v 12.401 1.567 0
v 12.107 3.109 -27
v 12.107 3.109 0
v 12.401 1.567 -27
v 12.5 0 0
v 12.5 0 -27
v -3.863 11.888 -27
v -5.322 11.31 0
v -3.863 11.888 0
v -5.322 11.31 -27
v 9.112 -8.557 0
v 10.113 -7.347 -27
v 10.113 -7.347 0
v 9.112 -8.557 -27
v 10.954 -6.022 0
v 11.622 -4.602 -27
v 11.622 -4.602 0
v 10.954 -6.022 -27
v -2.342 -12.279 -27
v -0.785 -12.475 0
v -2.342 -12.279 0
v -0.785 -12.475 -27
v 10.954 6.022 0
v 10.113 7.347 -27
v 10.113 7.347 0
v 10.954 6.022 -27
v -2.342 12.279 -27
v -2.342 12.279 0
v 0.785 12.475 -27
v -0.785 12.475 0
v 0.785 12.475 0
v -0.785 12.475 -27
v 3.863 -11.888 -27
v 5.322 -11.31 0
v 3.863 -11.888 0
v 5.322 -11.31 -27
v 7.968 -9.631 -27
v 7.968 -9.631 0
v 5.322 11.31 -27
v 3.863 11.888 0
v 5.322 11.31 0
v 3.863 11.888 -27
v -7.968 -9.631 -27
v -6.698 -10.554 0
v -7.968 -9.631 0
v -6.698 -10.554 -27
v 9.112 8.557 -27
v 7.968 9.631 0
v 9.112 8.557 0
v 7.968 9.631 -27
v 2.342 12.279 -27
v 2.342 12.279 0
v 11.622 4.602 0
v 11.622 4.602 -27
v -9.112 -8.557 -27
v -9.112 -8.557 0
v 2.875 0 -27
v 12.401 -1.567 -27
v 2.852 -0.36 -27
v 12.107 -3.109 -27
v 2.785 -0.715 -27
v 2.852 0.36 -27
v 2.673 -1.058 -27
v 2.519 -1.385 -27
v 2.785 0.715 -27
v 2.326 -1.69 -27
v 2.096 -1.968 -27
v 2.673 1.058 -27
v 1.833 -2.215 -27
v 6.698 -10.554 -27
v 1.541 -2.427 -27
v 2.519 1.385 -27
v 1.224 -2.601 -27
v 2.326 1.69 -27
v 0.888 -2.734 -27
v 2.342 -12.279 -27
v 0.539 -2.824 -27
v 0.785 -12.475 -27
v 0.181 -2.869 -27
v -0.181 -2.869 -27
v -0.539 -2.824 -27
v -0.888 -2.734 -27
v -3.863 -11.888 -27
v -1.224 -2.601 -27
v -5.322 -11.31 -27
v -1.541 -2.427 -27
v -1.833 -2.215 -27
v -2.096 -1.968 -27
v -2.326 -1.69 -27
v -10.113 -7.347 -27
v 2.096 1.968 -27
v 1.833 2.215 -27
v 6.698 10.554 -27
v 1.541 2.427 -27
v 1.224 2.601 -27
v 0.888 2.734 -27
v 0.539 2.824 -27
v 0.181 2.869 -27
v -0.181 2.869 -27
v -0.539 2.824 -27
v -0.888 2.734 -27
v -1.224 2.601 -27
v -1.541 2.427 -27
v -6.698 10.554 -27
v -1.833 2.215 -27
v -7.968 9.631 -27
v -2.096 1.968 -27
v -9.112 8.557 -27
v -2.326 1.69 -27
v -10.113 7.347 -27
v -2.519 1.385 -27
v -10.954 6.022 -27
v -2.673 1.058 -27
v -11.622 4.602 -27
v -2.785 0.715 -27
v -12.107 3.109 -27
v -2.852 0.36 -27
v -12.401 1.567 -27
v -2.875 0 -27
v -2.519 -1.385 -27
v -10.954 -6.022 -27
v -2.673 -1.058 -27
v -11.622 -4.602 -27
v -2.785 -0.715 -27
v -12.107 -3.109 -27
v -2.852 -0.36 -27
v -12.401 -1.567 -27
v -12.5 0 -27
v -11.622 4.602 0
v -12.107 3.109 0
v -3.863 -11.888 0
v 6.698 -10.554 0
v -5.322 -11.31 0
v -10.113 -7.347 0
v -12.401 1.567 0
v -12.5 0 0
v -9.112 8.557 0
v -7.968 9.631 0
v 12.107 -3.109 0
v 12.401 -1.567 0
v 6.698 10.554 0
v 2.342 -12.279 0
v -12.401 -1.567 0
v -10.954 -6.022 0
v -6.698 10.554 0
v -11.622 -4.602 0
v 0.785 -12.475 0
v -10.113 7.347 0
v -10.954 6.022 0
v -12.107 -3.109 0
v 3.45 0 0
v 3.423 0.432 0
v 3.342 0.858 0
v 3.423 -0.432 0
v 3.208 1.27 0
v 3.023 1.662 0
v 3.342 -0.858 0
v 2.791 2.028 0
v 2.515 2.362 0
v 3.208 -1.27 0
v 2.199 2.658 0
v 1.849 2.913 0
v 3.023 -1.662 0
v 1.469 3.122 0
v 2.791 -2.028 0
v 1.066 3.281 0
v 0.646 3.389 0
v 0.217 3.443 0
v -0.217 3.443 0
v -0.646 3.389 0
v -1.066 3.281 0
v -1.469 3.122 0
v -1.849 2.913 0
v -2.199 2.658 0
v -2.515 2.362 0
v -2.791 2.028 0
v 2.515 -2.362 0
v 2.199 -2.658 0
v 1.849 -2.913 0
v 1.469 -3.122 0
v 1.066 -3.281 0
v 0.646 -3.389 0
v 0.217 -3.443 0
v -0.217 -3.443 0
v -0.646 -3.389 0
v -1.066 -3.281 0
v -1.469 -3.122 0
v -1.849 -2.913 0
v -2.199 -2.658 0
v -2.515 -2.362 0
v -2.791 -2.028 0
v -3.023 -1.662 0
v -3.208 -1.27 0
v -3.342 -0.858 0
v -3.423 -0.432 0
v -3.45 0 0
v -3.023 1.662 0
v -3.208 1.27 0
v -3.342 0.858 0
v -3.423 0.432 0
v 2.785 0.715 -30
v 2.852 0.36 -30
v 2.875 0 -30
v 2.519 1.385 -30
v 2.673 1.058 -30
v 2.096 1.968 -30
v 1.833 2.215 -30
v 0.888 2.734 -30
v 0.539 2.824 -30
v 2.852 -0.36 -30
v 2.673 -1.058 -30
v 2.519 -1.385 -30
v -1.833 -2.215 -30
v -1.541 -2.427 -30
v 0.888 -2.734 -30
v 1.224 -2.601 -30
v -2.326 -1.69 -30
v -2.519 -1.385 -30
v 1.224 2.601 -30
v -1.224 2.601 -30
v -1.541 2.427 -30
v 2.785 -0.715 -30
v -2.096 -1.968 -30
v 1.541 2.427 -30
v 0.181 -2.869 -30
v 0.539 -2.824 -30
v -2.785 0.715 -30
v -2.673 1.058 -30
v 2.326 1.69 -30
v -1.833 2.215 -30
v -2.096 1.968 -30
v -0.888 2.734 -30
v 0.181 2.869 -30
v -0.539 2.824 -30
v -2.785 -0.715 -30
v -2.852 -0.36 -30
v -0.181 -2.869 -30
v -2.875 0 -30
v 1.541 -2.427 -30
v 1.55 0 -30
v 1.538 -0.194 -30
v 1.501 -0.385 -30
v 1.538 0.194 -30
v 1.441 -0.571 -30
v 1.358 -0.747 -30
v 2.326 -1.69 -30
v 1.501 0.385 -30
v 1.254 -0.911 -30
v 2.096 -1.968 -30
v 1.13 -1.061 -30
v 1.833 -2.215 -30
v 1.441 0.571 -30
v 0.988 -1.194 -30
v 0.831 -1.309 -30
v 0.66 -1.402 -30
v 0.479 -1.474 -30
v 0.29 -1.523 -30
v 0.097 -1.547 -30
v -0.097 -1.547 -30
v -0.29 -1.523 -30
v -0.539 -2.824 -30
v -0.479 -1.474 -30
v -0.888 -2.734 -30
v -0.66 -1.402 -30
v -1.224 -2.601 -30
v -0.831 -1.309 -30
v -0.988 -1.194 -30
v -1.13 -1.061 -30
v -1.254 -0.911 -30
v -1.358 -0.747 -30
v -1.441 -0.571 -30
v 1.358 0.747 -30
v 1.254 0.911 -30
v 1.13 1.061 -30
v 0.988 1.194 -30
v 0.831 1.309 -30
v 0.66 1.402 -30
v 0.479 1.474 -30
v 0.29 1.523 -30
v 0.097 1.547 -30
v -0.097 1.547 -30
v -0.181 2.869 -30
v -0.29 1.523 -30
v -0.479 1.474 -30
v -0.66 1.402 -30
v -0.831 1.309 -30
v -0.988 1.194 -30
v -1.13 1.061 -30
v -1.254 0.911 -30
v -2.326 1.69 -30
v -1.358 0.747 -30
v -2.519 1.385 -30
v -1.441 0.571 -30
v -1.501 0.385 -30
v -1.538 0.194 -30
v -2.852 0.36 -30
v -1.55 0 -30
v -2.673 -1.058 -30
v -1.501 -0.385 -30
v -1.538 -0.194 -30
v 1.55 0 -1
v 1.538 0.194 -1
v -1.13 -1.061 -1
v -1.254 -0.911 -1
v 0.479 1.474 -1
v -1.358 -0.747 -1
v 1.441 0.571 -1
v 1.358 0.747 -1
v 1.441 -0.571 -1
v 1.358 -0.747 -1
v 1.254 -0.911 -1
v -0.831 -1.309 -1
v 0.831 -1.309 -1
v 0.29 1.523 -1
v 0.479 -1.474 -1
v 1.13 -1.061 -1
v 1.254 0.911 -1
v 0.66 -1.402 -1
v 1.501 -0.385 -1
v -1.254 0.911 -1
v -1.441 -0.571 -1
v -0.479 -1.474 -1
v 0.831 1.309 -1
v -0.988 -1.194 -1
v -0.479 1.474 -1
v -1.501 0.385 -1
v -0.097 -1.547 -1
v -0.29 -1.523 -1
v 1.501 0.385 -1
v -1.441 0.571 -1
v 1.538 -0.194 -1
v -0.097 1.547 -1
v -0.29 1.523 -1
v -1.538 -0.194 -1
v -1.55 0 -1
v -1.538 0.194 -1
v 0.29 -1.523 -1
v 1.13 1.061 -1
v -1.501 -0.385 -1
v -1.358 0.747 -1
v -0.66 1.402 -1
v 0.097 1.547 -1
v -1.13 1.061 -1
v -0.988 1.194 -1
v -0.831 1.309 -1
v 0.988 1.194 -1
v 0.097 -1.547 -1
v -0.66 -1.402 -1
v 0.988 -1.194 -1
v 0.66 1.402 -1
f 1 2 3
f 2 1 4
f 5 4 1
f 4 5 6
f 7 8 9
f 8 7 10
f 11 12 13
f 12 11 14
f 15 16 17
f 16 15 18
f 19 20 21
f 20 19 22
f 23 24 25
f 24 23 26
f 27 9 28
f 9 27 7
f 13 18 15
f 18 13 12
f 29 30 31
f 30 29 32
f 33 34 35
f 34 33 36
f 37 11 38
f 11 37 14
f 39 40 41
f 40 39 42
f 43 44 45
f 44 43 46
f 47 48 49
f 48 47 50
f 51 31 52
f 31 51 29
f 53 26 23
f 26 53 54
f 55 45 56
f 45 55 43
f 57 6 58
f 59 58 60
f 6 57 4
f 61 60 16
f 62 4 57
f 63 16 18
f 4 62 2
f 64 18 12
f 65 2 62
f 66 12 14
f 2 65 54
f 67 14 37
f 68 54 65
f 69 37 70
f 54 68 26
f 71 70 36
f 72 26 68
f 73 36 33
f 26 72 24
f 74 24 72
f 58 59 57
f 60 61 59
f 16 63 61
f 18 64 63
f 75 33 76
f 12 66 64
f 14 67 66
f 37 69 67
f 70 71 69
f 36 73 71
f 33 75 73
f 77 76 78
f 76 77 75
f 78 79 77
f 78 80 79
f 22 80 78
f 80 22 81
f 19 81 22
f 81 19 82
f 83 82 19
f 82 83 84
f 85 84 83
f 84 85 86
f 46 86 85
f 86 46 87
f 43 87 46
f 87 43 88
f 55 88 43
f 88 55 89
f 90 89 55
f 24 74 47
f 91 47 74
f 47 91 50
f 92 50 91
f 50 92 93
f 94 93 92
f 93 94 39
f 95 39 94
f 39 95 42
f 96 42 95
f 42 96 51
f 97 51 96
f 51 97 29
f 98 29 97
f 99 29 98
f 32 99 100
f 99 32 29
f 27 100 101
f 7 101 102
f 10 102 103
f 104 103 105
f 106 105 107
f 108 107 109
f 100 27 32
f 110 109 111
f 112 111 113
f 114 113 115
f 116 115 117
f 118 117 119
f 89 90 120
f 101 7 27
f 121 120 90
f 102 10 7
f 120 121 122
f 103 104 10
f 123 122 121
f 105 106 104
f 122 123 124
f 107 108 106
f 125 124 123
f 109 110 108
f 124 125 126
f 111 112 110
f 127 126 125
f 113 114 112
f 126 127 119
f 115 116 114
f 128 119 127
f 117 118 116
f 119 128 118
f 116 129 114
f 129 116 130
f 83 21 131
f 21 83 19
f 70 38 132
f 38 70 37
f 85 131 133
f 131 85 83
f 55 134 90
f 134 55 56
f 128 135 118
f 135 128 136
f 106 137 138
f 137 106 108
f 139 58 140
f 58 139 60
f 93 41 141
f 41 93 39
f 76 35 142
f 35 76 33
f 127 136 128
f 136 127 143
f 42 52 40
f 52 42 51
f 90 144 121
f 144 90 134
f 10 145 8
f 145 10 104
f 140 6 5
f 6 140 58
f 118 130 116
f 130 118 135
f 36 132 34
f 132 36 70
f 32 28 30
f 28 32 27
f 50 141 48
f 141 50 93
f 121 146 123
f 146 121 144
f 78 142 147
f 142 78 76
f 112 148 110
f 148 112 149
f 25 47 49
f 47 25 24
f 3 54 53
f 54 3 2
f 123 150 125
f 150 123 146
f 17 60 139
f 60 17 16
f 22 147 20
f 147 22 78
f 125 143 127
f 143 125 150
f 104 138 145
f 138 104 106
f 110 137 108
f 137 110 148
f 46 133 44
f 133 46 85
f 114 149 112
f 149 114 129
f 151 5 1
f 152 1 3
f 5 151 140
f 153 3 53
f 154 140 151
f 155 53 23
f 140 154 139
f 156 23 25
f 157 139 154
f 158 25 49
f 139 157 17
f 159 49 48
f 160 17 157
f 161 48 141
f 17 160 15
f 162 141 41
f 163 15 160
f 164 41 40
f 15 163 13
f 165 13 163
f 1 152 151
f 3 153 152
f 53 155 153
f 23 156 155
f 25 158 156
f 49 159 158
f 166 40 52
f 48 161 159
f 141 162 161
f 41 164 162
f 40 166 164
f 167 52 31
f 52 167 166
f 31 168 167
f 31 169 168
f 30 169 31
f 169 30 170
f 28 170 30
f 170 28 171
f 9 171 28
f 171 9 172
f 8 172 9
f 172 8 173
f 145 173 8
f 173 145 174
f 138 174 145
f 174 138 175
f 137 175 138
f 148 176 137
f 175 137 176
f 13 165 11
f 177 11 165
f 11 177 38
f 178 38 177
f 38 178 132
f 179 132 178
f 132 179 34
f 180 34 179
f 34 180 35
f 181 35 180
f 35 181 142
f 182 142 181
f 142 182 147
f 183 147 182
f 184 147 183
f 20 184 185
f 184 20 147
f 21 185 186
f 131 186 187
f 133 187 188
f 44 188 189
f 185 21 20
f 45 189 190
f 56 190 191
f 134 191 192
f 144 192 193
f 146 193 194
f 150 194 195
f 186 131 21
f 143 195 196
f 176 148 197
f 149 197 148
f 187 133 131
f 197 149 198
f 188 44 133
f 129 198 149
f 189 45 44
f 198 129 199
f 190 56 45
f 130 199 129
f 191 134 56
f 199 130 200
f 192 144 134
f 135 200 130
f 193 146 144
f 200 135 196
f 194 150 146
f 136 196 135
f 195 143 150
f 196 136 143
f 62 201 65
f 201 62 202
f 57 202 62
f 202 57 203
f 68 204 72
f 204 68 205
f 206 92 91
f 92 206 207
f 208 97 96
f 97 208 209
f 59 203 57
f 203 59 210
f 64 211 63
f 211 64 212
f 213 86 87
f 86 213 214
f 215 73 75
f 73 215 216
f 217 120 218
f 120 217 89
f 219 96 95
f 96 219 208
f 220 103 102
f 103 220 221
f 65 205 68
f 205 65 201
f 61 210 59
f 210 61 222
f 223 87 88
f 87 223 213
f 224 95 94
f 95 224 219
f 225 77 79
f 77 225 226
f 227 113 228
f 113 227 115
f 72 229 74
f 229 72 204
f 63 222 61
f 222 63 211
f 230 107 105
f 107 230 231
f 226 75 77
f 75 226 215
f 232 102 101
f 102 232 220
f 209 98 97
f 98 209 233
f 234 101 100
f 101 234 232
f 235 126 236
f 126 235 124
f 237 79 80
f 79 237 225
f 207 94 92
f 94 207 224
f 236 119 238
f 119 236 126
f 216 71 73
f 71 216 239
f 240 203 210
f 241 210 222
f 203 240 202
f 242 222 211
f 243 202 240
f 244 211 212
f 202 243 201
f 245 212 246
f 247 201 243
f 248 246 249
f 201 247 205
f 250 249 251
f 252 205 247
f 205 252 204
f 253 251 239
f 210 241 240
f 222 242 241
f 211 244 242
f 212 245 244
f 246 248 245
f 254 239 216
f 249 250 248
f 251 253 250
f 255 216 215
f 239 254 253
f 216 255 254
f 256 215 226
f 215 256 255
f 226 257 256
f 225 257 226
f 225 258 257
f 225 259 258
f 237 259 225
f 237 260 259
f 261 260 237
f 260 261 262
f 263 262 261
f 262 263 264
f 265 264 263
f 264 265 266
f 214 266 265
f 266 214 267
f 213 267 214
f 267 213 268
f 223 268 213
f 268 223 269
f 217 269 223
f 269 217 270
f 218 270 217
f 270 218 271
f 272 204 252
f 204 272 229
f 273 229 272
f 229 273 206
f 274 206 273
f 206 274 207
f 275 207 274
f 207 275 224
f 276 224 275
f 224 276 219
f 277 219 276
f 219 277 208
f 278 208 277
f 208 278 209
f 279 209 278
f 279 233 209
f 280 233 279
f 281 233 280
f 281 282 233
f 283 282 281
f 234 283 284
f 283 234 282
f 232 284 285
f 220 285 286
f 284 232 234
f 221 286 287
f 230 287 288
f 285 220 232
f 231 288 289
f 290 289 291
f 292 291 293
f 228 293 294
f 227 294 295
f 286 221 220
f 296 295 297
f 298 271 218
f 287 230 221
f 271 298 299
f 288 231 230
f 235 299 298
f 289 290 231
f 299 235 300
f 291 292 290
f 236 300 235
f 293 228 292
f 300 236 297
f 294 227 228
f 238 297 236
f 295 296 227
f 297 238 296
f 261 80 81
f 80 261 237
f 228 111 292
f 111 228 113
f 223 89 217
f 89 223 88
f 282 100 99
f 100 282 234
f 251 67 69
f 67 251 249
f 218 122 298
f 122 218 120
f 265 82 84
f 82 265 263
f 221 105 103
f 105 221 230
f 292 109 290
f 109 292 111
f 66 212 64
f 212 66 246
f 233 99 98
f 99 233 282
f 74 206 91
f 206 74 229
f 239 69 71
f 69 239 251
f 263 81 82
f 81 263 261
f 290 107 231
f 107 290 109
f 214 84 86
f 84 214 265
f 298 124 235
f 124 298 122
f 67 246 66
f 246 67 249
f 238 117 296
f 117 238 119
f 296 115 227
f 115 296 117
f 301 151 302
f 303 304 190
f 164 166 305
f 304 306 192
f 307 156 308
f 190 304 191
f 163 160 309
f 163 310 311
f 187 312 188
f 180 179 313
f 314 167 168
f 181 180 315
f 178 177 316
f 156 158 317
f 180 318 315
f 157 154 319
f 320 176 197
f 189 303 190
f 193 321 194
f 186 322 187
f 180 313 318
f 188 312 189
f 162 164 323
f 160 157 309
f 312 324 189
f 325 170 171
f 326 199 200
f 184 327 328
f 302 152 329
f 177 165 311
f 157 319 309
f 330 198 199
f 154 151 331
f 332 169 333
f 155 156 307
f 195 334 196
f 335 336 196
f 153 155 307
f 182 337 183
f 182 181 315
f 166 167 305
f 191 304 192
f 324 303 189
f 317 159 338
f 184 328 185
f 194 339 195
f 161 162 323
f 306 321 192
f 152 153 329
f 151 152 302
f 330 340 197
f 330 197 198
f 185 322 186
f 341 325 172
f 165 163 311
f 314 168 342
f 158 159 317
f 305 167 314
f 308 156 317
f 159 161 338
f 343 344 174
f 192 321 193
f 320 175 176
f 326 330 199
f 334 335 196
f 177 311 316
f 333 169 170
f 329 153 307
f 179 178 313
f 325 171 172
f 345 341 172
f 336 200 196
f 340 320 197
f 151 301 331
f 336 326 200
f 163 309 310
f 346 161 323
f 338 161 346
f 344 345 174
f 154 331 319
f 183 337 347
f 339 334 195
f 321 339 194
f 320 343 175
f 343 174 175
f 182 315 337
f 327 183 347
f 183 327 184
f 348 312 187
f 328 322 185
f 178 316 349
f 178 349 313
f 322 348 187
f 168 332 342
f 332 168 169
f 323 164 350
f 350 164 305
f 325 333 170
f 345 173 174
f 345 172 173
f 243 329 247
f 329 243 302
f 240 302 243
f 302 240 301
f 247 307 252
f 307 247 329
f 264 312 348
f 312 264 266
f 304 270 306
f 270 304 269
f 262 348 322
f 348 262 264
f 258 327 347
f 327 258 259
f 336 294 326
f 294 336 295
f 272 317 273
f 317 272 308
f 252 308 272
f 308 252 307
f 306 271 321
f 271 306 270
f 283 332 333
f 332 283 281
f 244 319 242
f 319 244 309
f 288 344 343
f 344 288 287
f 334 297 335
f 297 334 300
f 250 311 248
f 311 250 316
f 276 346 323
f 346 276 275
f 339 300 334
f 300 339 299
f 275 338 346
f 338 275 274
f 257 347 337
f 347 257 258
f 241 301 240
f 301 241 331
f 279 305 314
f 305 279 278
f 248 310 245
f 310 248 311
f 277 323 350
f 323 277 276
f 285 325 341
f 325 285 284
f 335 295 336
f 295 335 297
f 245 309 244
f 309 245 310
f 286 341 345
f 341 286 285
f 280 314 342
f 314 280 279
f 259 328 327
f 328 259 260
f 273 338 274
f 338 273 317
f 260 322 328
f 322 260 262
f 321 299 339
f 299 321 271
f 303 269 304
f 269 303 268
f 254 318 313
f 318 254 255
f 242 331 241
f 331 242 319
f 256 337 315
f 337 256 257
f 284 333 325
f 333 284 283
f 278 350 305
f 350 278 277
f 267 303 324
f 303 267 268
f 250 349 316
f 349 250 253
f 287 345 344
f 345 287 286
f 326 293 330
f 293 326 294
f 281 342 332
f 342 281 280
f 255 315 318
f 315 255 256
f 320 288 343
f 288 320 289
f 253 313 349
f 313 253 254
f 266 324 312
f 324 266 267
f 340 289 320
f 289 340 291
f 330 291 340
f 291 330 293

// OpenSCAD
$fn = 50;

difference() {
	union() {
		translate(v = [0, 0, -27.0]) {
			cylinder(h = 27, r = 12.5);
		}
		#translate(v = [0, 0, -30.0]) {
			cylinder(h = 30, r = 2.875);
		}
	}
	union() {
		translate(v = [0, 0, 0]) {
			rotate(a = [0, 0, 0]) {
				difference() {
					union() {
						translate(v = [0, 0, -30.0]) {
							cylinder(h = 30, r = 1.25);
						}
						translate(v = [0, 0, -1.0]) {
							cylinder(h = 1.0, r1 = 1.55, r2 = 3.45);
						}
						translate(v = [0, 0, -30.0]) {
							cylinder(h = 30, r = 1.55);
						}
						translate(v = [0, 0, -30.0]) {
							cylinder(h = 30, r = 1.25);
						}
					}
					union();
				}
			}
		}
	}
}
